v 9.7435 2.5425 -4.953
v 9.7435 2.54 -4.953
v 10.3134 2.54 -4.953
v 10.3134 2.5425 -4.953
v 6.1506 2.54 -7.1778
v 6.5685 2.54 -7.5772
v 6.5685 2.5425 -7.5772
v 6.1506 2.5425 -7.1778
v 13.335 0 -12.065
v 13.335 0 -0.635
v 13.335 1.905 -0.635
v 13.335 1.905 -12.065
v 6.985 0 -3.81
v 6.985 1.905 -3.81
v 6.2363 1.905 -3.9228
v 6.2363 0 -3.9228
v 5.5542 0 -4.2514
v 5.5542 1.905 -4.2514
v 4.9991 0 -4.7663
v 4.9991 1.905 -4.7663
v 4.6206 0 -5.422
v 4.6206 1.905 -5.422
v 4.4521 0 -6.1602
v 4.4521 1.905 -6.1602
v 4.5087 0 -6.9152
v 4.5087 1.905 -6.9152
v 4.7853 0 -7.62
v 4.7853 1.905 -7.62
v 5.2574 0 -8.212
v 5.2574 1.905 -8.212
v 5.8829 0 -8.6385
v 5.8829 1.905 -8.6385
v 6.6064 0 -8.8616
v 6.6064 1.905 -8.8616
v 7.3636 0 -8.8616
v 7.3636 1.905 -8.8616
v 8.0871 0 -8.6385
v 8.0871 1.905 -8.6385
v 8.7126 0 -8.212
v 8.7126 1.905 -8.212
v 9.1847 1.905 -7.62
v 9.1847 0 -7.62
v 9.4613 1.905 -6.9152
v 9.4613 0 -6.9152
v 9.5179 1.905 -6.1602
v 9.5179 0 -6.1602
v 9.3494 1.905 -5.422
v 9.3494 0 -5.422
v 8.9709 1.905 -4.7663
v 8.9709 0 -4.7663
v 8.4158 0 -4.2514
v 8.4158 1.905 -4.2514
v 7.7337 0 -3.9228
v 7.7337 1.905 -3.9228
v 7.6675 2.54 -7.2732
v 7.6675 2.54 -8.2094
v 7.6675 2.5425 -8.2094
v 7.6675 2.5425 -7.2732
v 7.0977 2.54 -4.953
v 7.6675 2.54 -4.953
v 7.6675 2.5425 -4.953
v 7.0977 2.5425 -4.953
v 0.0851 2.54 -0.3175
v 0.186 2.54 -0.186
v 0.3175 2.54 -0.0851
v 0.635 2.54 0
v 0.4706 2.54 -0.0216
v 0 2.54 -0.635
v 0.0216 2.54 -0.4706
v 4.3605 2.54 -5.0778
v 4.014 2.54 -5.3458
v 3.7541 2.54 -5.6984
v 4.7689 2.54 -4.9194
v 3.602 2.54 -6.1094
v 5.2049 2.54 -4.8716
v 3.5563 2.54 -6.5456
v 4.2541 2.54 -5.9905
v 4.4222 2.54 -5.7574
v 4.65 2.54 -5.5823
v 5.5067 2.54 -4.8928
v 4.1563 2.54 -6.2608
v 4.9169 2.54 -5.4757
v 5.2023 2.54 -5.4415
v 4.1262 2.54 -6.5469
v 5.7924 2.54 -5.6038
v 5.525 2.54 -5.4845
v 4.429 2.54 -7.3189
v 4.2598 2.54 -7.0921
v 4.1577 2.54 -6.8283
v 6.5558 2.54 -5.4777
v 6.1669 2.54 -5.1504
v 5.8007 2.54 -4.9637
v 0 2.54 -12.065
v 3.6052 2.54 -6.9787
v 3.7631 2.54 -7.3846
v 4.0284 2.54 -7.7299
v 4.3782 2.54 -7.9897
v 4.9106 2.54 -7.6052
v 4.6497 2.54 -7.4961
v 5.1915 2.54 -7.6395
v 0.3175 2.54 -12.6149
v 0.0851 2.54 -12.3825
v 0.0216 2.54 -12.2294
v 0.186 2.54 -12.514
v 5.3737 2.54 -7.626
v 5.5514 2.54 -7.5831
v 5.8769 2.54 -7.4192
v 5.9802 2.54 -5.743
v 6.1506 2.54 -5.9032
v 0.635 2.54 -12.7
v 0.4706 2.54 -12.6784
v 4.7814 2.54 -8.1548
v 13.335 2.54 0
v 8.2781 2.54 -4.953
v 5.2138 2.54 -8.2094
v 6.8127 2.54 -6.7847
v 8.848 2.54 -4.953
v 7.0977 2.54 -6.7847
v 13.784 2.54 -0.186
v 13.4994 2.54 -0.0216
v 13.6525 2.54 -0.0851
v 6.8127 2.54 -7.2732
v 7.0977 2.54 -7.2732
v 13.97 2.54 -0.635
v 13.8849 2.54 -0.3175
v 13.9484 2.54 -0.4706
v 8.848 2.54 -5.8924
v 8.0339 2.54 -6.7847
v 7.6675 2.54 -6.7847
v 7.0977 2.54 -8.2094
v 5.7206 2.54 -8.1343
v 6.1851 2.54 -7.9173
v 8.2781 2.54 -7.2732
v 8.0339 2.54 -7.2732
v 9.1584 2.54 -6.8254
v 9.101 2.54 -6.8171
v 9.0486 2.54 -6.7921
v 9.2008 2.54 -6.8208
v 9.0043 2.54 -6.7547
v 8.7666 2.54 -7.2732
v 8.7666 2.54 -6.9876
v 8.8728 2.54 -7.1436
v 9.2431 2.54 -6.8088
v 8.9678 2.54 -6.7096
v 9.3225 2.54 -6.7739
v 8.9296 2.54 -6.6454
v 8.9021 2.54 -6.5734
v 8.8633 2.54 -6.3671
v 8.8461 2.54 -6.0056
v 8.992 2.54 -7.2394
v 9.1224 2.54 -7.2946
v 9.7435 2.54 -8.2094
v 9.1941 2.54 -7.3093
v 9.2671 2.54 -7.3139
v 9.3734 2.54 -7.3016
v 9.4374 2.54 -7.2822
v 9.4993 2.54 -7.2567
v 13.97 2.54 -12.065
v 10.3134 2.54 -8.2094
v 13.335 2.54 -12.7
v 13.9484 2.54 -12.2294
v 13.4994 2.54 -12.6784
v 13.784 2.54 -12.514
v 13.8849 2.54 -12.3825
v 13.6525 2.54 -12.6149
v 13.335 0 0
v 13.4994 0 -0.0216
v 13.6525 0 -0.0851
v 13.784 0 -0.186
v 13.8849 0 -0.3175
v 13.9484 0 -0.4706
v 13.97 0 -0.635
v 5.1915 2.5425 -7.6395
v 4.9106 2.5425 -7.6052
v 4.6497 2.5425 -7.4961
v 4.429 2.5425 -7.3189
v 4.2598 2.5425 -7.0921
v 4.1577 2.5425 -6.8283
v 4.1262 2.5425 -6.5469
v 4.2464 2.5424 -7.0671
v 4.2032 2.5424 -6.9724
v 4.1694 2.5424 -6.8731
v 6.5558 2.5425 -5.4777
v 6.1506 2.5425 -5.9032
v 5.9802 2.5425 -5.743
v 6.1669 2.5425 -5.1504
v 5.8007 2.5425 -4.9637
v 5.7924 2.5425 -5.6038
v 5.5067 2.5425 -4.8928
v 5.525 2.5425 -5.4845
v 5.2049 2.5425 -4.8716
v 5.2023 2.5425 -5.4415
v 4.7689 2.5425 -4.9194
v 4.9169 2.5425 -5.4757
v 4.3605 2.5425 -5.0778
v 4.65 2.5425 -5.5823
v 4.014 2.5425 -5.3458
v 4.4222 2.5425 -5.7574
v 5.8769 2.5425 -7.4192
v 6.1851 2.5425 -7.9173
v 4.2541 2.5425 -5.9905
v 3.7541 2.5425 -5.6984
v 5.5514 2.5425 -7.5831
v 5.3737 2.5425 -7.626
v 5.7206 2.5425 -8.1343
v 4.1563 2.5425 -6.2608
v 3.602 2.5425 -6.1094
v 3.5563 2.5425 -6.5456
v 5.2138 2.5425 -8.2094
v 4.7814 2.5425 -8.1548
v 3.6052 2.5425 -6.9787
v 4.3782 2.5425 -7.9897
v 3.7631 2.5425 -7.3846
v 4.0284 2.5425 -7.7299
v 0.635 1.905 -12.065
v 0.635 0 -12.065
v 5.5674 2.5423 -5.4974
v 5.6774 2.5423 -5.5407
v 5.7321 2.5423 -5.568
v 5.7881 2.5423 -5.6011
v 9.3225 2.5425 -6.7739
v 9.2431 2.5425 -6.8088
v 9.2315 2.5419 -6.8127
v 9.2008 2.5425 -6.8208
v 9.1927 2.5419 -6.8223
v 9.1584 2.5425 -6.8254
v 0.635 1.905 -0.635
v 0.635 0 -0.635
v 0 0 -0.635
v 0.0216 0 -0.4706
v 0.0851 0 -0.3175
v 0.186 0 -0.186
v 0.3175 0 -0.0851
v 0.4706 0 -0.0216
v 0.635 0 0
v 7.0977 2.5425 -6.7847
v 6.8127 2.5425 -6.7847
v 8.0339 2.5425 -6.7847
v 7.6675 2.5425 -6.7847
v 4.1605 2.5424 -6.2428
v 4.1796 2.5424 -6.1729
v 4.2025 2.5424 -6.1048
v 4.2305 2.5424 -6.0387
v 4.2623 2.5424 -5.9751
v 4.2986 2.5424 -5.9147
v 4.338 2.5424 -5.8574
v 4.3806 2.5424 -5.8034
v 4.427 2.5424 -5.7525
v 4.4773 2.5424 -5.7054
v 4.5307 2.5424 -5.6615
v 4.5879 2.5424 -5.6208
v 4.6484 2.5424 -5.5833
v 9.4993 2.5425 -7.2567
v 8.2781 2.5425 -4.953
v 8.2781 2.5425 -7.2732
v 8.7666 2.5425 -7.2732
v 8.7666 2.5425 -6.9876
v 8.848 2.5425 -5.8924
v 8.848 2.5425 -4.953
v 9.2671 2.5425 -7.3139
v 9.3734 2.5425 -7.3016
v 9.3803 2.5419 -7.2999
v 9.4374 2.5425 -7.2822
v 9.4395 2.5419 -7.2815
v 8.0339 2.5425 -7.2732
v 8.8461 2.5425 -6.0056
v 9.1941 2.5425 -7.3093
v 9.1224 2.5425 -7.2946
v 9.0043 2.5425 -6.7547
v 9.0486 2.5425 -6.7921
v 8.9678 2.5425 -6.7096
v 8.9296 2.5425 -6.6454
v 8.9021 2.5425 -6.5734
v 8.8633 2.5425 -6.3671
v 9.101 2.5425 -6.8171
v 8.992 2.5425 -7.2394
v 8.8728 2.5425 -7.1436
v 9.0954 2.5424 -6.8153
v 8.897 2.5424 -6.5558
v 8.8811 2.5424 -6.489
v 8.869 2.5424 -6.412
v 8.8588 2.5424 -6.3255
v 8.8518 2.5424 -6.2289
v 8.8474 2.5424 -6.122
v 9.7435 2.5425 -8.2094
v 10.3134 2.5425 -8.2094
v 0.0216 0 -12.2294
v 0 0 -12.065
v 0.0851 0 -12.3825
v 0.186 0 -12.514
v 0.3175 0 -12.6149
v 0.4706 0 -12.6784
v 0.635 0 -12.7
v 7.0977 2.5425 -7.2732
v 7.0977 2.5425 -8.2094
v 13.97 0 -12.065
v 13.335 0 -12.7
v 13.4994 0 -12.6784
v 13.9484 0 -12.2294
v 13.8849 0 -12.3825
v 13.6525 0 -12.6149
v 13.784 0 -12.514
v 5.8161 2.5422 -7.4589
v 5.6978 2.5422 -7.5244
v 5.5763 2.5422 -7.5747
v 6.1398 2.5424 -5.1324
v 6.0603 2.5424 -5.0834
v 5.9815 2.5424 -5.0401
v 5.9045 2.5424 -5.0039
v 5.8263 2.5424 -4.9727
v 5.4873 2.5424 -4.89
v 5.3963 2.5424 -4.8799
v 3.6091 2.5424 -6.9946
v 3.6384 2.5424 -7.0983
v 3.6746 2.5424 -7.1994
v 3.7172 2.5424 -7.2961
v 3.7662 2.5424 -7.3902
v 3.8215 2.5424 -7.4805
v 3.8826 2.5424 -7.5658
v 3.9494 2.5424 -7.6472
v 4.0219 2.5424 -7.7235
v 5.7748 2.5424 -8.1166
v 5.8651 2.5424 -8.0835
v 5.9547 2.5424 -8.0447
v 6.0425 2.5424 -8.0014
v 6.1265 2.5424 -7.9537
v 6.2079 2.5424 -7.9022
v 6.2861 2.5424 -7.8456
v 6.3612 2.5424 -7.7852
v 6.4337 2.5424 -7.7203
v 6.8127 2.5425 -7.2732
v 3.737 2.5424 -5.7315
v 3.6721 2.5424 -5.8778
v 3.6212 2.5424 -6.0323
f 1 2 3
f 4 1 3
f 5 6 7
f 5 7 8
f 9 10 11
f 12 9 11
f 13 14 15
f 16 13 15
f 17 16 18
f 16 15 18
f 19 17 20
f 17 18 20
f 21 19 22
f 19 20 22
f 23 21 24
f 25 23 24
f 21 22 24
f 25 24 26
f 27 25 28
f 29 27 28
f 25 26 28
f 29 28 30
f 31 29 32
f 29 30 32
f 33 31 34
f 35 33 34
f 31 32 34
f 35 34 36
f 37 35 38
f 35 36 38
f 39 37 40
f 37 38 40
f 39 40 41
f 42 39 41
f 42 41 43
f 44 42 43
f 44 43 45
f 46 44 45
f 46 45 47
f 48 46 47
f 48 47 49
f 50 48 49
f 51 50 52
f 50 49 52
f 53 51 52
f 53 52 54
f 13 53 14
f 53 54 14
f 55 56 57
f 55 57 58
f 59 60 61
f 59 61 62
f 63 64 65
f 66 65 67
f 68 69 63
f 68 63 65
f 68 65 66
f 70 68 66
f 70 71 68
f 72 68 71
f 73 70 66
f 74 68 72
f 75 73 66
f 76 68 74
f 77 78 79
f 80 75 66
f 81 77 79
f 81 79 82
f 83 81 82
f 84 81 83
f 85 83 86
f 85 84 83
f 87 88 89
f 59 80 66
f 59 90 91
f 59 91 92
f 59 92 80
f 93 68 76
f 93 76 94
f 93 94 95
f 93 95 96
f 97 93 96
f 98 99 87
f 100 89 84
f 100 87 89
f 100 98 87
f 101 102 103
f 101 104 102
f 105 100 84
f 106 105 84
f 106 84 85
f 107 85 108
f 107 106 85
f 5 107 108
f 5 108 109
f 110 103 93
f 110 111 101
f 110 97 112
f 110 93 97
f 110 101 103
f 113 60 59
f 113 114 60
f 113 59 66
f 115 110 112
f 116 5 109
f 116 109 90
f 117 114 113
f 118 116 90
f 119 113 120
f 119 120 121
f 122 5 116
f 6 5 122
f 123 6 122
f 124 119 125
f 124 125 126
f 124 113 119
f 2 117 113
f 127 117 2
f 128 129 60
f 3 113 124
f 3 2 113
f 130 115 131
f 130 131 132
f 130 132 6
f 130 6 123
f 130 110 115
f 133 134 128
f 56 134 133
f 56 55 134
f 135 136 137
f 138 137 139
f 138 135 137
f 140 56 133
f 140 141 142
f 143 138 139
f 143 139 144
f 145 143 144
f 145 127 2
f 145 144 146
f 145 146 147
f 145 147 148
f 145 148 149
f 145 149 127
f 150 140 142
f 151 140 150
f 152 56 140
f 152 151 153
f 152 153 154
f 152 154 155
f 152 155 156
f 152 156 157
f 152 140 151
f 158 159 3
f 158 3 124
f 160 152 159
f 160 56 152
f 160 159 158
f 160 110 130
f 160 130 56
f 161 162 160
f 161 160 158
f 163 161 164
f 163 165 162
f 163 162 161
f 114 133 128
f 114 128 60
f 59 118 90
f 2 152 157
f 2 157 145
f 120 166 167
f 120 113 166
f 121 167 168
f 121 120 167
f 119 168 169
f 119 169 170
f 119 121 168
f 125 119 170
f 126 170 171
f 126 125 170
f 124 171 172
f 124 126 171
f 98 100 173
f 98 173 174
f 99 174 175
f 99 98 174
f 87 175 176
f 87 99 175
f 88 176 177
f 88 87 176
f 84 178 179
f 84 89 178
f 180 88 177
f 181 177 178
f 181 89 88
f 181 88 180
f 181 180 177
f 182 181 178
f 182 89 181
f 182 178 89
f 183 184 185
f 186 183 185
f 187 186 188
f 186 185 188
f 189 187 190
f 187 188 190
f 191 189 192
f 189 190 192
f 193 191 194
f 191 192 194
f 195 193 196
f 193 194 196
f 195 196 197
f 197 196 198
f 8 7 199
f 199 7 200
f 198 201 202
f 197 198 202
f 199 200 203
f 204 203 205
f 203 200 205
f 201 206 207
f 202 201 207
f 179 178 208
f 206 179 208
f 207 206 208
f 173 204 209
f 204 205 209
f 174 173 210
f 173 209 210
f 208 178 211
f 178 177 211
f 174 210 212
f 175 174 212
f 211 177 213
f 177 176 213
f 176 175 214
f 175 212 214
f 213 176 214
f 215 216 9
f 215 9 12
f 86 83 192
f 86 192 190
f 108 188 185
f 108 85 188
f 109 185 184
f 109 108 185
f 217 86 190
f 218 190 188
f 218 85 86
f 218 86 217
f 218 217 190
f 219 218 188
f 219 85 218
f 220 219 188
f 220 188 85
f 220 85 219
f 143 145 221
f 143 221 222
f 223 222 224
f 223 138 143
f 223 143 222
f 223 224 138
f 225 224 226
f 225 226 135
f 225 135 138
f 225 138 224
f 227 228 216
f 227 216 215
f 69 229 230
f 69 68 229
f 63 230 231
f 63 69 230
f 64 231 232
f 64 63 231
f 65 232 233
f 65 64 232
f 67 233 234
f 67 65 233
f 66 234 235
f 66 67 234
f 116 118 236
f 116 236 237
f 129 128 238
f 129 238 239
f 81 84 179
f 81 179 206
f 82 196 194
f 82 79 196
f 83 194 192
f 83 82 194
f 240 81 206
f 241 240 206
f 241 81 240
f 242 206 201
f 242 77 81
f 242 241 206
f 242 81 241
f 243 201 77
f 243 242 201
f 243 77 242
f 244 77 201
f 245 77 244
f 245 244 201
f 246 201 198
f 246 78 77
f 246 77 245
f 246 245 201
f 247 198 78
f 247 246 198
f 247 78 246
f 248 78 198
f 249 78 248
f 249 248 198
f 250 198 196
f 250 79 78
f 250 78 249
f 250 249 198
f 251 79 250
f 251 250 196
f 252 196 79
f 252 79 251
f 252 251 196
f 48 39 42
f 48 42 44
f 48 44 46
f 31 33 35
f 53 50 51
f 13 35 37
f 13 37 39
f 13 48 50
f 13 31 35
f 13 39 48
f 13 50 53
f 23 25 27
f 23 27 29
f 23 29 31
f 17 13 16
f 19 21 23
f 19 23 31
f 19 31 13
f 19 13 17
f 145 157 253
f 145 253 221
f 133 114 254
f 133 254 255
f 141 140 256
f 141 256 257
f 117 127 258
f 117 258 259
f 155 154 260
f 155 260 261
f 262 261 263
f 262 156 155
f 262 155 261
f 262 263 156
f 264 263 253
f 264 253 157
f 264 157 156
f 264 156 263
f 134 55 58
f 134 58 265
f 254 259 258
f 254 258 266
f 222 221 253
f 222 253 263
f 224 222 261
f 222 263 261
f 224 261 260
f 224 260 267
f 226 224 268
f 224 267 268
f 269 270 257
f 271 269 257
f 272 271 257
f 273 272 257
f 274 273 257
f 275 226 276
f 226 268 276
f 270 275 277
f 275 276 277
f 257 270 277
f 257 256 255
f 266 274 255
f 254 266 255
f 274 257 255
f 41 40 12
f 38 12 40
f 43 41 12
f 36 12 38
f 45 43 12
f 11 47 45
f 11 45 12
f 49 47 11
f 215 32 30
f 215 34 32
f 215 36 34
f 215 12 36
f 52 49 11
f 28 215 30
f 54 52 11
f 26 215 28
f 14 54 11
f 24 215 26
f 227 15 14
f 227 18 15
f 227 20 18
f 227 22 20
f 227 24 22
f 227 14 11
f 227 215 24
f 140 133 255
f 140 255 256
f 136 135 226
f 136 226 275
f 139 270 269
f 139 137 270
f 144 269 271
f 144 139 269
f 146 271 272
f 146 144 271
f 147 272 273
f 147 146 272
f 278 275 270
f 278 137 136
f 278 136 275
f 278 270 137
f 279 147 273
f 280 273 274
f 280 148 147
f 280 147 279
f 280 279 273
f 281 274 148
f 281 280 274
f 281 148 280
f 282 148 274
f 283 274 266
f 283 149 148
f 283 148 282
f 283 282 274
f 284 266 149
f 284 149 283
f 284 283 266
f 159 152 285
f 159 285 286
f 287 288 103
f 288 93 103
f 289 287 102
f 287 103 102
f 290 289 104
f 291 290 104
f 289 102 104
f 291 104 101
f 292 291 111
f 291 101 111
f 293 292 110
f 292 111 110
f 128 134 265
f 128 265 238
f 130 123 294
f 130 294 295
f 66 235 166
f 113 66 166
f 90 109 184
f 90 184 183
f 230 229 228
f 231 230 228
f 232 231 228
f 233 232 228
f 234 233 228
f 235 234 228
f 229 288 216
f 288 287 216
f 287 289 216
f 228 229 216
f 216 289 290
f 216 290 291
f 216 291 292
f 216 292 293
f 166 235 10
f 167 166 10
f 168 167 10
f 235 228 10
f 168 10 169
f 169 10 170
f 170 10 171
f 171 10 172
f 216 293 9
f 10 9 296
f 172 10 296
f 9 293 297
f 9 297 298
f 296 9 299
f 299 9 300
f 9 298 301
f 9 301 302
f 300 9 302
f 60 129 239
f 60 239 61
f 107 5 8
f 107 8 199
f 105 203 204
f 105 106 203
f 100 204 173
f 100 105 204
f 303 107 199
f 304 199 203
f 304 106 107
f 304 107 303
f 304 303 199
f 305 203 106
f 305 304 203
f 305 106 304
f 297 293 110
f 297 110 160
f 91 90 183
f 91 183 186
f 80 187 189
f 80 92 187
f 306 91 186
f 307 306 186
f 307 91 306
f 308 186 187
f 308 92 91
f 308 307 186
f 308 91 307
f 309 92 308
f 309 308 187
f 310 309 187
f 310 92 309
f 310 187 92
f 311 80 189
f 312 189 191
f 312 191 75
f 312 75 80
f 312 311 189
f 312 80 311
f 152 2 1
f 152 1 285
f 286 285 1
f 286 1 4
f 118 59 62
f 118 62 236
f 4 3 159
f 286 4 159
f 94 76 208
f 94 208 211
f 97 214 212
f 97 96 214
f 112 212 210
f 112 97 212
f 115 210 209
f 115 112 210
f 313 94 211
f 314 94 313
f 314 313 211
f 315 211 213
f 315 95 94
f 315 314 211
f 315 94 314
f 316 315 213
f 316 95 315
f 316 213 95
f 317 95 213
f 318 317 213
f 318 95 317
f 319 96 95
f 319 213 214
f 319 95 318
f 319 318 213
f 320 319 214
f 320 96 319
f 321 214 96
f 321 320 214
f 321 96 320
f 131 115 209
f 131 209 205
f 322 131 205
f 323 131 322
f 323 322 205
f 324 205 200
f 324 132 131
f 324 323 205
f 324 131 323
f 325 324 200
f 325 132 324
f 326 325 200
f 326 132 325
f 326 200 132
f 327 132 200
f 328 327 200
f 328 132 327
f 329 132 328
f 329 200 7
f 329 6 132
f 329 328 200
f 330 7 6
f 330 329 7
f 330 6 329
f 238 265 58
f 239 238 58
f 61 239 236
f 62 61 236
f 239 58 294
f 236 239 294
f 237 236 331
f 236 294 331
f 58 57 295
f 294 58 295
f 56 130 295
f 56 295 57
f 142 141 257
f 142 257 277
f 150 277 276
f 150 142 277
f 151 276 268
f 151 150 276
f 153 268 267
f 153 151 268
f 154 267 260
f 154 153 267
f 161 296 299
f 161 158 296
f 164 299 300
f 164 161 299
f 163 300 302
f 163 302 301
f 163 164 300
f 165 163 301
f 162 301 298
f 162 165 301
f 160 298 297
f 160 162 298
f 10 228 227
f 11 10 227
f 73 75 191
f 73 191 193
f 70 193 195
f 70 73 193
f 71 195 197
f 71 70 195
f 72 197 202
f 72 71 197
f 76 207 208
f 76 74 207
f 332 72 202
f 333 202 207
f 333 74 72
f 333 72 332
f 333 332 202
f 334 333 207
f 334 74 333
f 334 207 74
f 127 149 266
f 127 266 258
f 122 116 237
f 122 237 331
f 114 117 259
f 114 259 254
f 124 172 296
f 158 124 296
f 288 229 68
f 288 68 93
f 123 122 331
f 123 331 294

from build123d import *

# Parameters (mm, degrees)
SKETCH1_W           = 13.97
SKETCH1_H           = 12.7
BOSS_EXTRUDE1_DEPTH = 2.54
FILLET1_R           = 0.635
SHELL1_START        = 0.635
SHELL1_OUTLINE_W    = 1.905
SHELL1_OUTLINE_H    = 11.43
SHELL1_DEPTH        = 12.7
SKETCH2_R           = 2.54
BOSS_EXTRUDE2_DEPTH = 1.905
SKETCH3_W           = 0.569871795
SKETCH3_H           = 3.256410256
BOSS_EXTRUDE3_DEPTH = 0.00254


# Read off the part's stored shape, not the designer's step: Shell1
with BuildPart() as part:
    # Sketch1 → Boss-Extrude1 (new body)
    with BuildSketch(Plane(origin=(0, 0, 0), x_dir=(1, 0, 0), z_dir=(0, 1, 0))):
        with Locations((6.985, 6.35)):
            Rectangle(SKETCH1_W, SKETCH1_H)
    extrude(amount=BOSS_EXTRUDE1_DEPTH)

    # Fillet1
    fillet1_edges = [part.edges().sort_by_distance(p)[0] for p in [
        (0, 1.27, -12.7),
        (13.97, 1.27, -12.7),
        (13.97, 1.27, 0),
        (0, 1.27, 0),
    ]]
    fillet(fillet1_edges, radius=FILLET1_R)

    # Shell1 outline → Shell1 (cut)
    with BuildSketch(Plane.YZ.offset(SHELL1_START)):
        with Locations((0.9525, -6.35)):
            Rectangle(SHELL1_OUTLINE_W, SHELL1_OUTLINE_H)
    extrude(amount=SHELL1_DEPTH, mode=Mode.SUBTRACT)

    # Sketch2 → Boss-Extrude2 (add)
    with BuildSketch(Plane(origin=(0, 1.905, 0), x_dir=(-1, 0, 0), z_dir=(0, -1, 0))):
        with Locations(Location((-6.985, 6.35, 0), (0, 0, 270))):
            Circle(SKETCH2_R)
    extrude(amount=BOSS_EXTRUDE2_DEPTH)

    # Sketch3 → Boss-Extrude3 (add)
    with BuildSketch(Plane(origin=(0, 2.54, 0), x_dir=(1, 0, 0), z_dir=(0, 1, 0))):
        with BuildLine():
            Line((6.568505128, 7.577208734), (6.150641546, 7.177789663))
            add(Edge.make_bspline(
                [(6.150641546, 7.177789663), (6.115194953, 7.2144415), (6.045956652, 7.28603402), (5.934387691, 7.380816208), (5.818360035, 7.459804336), (5.700130769, 7.526327635), (5.577573291, 7.576657252), (5.452104701, 7.613333291), (5.322923843, 7.635693286), (5.235499207, 7.638251666), (5.191526963, 7.639538462)],
                knots=[0, 0, 0, 0, 1.115251505, 2.178435587, 3.19620269, 4.182487026, 5.141301733, 6.088180966, 7.038406374, 8, 8, 8, 8], degree=3))
            add(Edge.make_bspline(
                [(5.191526963, 7.639538462), (5.154804796, 7.638521848), (5.082337645, 7.636515672), (4.975936877, 7.621808428), (4.874159044, 7.596798119), (4.776655743, 7.562329281), (4.683713883, 7.517728433), (4.5951386, 7.463030097), (4.511148271, 7.398728275), (4.432852361, 7.325155668), (4.361230014, 7.244772066), (4.29794711, 7.159002955), (4.244937527, 7.068044826), (4.201433425, 6.972818837), (4.16754541, 6.872884235), (4.143345111, 6.7683083), (4.129348304, 6.658966489), (4.127259187, 6.584636741), (4.126197436, 6.546860176)],
                knots=[0, 0, 0, 0, 1.035432265, 2.043311493, 3.022114605, 3.98653278, 4.95457646, 5.923598177, 6.917315552, 7.932509744, 8.948865224, 9.949768934, 10.933144597, 11.912367597, 12.897413939, 13.903909035, 14.934704909, 16, 16, 16, 16], degree=3))
            add(Edge.make_bspline(
                [(4.126197436, 6.546860176), (4.12650342, 6.52034594), (4.127106522, 6.468085836), (4.133708537, 6.390778637), (4.144339337, 6.315772378), (4.159724739, 6.243180674), (4.178964335, 6.172940615), (4.201536762, 6.104446244), (4.229853539, 6.038643999), (4.26128559, 5.974769629), (4.297840702, 5.914566028), (4.337253857, 5.857156898), (4.379990988, 5.802823652), (4.426328908, 5.751788408), (4.476919763, 5.704848731), (4.530455968, 5.660593089), (4.587840605, 5.620129351), (4.647881648, 5.582442035), (4.711097778, 5.549702743), (4.775773793, 5.52004727), (4.842890313, 5.495962616), (4.911630153, 5.476548188), (4.981747662, 5.460039117), (5.053928654, 5.449873974), (5.12754741, 5.442176031), (5.177301332, 5.441700728), (5.202339263, 5.441461538)],
                knots=[0, 0, 0, 0, 1.103660481, 2.175337485, 3.227646561, 4.255952547, 5.262355991, 6.258840057, 7.255597736, 8.242457506, 9.22035537, 10.185017736, 11.140346927, 12.096287581, 13.051739095, 14.01125915, 14.986044842, 15.97314143, 16.960198552, 17.947847494, 18.933482797, 19.925264591, 20.920966487, 21.929612487, 22.958107872, 24, 24, 24, 24], degree=3))
            add(Edge.make_bspline(
                [(5.202339263, 5.441461538), (5.244807897, 5.442689957), (5.328247719, 5.445103479), (5.450707656, 5.463976883), (5.567399775, 5.495022564), (5.66063622, 5.53168571), (5.733684512, 5.567891042), (5.789295097, 5.601379191), (5.846800776, 5.638839363), (5.905246429, 5.681685345), (5.965289454, 5.729402968), (6.025869952, 5.783037337), (6.088538796, 5.840822348), (6.129592535, 5.882064647), (6.150641546, 5.903210337)],
                knots=[0, 0, 0, 0, 1.404581149, 2.759636711, 4.088442092, 5.392261763, 6.066678138, 6.783632037, 7.538459478, 8.336747902, 9.180226004, 10.074962426, 11.012997595, 12, 12, 12, 12], degree=3))
            Line((6.150641546, 5.903210337), (6.555784776, 5.477714543))
            add(Edge.make_bspline(
                [(6.555784776, 5.477714543), (6.527305387, 5.450218588), (6.471719712, 5.396552363), (6.387870264, 5.320351332), (6.304126343, 5.251876235), (6.222511029, 5.188641725), (6.141687378, 5.132489979), (6.06166396, 5.083364915), (5.983346676, 5.04002409), (5.905109243, 5.003198427), (5.826464826, 4.971929614), (5.745548963, 4.945009219), (5.662114287, 4.922235533), (5.575651216, 4.903860159), (5.486966225, 4.88912559), (5.395229341, 4.879179841), (5.301022221, 4.872493645), (5.237120072, 4.871892834), (5.204883333, 4.871589744)],
                knots=[0, 0, 0, 0, 1.244526981, 2.429050516, 3.560637417, 4.644440555, 5.67424972, 6.652764056, 7.595344123, 8.486817594, 9.369275933, 10.254498637, 11.166417451, 12.086725134, 13.032340136, 13.991389299, 14.986715468, 16, 16, 16, 16], degree=3))
            add(Edge.make_bspline(
                [(5.204883333, 4.871589744), (5.145668437, 4.873099249), (5.029801344, 4.876052933), (4.86000114, 4.897937726), (4.698695505, 4.934627196), (4.545492012, 4.986516227), (4.400439375, 5.052802032), (4.263574704, 5.134065316), (4.135118595, 5.230090176), (4.016108719, 5.339751107), (3.908458622, 5.460862399), (3.813308403, 5.590902701), (3.734600139, 5.730511114), (3.669246971, 5.877625175), (3.618141653, 6.032916222), (3.582172173, 6.196552234), (3.559990057, 6.36837521), (3.557563302, 6.485734263), (3.556325641, 6.545588141)],
                knots=[0, 0, 0, 0, 1.078019885, 2.10938526, 3.111377082, 4.085535484, 5.04941344, 6.010039228, 6.978205633, 7.964457913, 8.951525778, 9.924444315, 10.892603023, 11.863865945, 12.85144698, 13.863884204, 14.910567087, 16, 16, 16, 16], degree=3))
            add(Edge.make_bspline(
                [(3.556325641, 6.545588141), (3.556848616, 6.58462433), (3.557885026, 6.661984515), (3.568777786, 6.775942336), (3.583962928, 6.887030827), (3.608052774, 6.994096523), (3.637090707, 7.098581794), (3.673203193, 7.199351009), (3.716332553, 7.296693788), (3.765088628, 7.390773089), (3.820245888, 7.480972592), (3.881862603, 7.56651734), (3.948352517, 7.648067724), (4.021313276, 7.724541827), (4.099684664, 7.796611105), (4.183820519, 7.863885002), (4.273214805, 7.927328301), (4.36810948, 7.985304953), (4.466660994, 8.037747916), (4.567626351, 8.08400485), (4.670757492, 8.122664994), (4.775618369, 8.154732158), (4.882652019, 8.178668028), (4.991094461, 8.19678671), (5.101868412, 8.206915169), (5.176243523, 8.208573262), (5.21378758, 8.209410256)],
                knots=[0, 0, 0, 0, 1.071919942, 2.124283339, 3.142214191, 4.149696895, 5.136002878, 6.119640489, 7.086990633, 8.058538607, 9.028339693, 9.988281803, 10.952401235, 11.916291999, 12.888973767, 13.874849856, 14.873389453, 15.898127285, 16.927174885, 17.938320013, 18.946391617, 19.950418109, 20.947802303, 21.956882652, 22.968648068, 24, 24, 24, 24], degree=3))
            add(Edge.make_bspline(
                [(5.21378758, 8.209410256), (5.24581651, 8.20893047), (5.309541359, 8.207975887), (5.404438353, 8.200018393), (5.498576405, 8.187521229), (5.591618472, 8.168665671), (5.684230086, 8.14628174), (5.775194226, 8.11697307), (5.865945903, 8.084303034), (5.955061809, 8.045252678), (6.042666337, 8.002625686), (6.126707215, 7.954263816), (6.20859548, 7.903143202), (6.286516537, 7.846238304), (6.361930016, 7.785613168), (6.434441572, 7.720984943), (6.503414876, 7.651276087), (6.546698691, 7.602022665), (6.568505128, 7.577208734)],
                knots=[0, 0, 0, 0, 0.996412454, 1.982464992, 2.961075852, 3.949442424, 4.934965278, 5.923860011, 6.921385422, 7.934793307, 8.949617135, 9.951082467, 10.950285876, 11.951772932, 12.951063433, 13.960125323, 14.972308753, 16, 16, 16, 16], degree=3))
        make_face()
        Polygon((7.097671795, 8.209410256), (7.66754359, 8.209410256), (7.66754359, 7.273192308), (8.033889744, 7.273192308), (8.033889744, 6.784730769), (7.66754359, 6.784730769), (7.66754359, 4.953), (7.097671795, 4.953), (7.097671795, 6.784730769), (6.812735897, 6.784730769), (6.812735897, 7.273192308), (7.097671795, 7.273192308), align=None)
        with BuildLine():
            Line((8.278120513, 7.273192308), (8.766582051, 7.273192308))
            Line((8.766582051, 7.273192308), (8.766582051, 6.987620393))
            add(Edge.make_bspline(
                [(8.766582051, 6.987620393), (8.78039969, 7.012999247), (8.80740684, 7.062603272), (8.857021237, 7.129186851), (8.914020267, 7.185261684), (8.976355778, 7.232000626), (9.044216695, 7.268429043), (9.115785825, 7.294388882), (9.190450896, 7.31125918), (9.241384876, 7.313011685), (9.267127925, 7.313897436)],
                knots=[0, 0, 0, 0, 1.09866127, 2.147379032, 3.14564304, 4.131443017, 5.102343063, 6.064490016, 7.021754664, 8, 8, 8, 8], degree=3))
            add(Edge.make_bspline(
                [(9.267127925, 7.313897436), (9.28582059, 7.313022129), (9.323885533, 7.311239691), (9.381901861, 7.300878355), (9.440755263, 7.282143087), (9.479485873, 7.265274469), (9.499274359, 7.256655849)],
                knots=[0, 0, 0, 0, 0.931404136, 1.896671404, 2.925354185, 4, 4, 4, 4], degree=3))
            Line((9.499274359, 7.256655849), (9.322461458, 6.77391847))
            add(Edge.make_bspline(
                [(9.322461458, 6.77391847), (9.30665691, 6.781554463), (9.276950443, 6.795907192), (9.233821811, 6.81284489), (9.194680789, 6.823179446), (9.1698661, 6.824721452), (9.15836891, 6.825435897)],
                knots=[0, 0, 0, 0, 1.214386998, 2.282580073, 3.20428172, 4, 4, 4, 4], degree=3))
            add(Edge.make_bspline(
                [(9.15836891, 6.825435897), (9.147513328, 6.824962468), (9.126158527, 6.824031151), (9.094639437, 6.816050083), (9.064955019, 6.802286977), (9.035674781, 6.784655073), (9.009108609, 6.760145407), (8.982558846, 6.731771118), (8.959161774, 6.696739283), (8.934471077, 6.657747072), (8.913447831, 6.610020641), (8.895421046, 6.553045117), (8.879359035, 6.486161255), (8.868306178, 6.409013934), (8.857623149, 6.322349687), (8.851264348, 6.225532411), (8.846525052, 6.118868249), (8.846235276, 6.044412815), (8.846084255, 6.005609175)],
                knots=[0, 0, 0, 0, 0.544232178, 1.070598461, 1.618251235, 2.182094276, 2.777567932, 3.425210017, 4.127676488, 4.886675562, 5.738955394, 6.734782583, 7.883056018, 9.186093582, 10.642914445, 12.264202625, 14.053029461, 16, 16, 16, 16], degree=3))
            Line((8.846084255, 6.005609175), (8.847992308, 5.892398037))
            Line((8.847992308, 5.892398037), (8.847992308, 4.953))
            Line((8.847992308, 4.953), (8.278120513, 4.953))
            Line((8.278120513, 4.953), (8.278120513, 7.273192308))
        make_face()
        with Locations((10.028441026, 6.581205128)):
            Rectangle(SKETCH3_W, SKETCH3_H)
    extrude(amount=BOSS_EXTRUDE3_DEPTH)


solid = part.part
